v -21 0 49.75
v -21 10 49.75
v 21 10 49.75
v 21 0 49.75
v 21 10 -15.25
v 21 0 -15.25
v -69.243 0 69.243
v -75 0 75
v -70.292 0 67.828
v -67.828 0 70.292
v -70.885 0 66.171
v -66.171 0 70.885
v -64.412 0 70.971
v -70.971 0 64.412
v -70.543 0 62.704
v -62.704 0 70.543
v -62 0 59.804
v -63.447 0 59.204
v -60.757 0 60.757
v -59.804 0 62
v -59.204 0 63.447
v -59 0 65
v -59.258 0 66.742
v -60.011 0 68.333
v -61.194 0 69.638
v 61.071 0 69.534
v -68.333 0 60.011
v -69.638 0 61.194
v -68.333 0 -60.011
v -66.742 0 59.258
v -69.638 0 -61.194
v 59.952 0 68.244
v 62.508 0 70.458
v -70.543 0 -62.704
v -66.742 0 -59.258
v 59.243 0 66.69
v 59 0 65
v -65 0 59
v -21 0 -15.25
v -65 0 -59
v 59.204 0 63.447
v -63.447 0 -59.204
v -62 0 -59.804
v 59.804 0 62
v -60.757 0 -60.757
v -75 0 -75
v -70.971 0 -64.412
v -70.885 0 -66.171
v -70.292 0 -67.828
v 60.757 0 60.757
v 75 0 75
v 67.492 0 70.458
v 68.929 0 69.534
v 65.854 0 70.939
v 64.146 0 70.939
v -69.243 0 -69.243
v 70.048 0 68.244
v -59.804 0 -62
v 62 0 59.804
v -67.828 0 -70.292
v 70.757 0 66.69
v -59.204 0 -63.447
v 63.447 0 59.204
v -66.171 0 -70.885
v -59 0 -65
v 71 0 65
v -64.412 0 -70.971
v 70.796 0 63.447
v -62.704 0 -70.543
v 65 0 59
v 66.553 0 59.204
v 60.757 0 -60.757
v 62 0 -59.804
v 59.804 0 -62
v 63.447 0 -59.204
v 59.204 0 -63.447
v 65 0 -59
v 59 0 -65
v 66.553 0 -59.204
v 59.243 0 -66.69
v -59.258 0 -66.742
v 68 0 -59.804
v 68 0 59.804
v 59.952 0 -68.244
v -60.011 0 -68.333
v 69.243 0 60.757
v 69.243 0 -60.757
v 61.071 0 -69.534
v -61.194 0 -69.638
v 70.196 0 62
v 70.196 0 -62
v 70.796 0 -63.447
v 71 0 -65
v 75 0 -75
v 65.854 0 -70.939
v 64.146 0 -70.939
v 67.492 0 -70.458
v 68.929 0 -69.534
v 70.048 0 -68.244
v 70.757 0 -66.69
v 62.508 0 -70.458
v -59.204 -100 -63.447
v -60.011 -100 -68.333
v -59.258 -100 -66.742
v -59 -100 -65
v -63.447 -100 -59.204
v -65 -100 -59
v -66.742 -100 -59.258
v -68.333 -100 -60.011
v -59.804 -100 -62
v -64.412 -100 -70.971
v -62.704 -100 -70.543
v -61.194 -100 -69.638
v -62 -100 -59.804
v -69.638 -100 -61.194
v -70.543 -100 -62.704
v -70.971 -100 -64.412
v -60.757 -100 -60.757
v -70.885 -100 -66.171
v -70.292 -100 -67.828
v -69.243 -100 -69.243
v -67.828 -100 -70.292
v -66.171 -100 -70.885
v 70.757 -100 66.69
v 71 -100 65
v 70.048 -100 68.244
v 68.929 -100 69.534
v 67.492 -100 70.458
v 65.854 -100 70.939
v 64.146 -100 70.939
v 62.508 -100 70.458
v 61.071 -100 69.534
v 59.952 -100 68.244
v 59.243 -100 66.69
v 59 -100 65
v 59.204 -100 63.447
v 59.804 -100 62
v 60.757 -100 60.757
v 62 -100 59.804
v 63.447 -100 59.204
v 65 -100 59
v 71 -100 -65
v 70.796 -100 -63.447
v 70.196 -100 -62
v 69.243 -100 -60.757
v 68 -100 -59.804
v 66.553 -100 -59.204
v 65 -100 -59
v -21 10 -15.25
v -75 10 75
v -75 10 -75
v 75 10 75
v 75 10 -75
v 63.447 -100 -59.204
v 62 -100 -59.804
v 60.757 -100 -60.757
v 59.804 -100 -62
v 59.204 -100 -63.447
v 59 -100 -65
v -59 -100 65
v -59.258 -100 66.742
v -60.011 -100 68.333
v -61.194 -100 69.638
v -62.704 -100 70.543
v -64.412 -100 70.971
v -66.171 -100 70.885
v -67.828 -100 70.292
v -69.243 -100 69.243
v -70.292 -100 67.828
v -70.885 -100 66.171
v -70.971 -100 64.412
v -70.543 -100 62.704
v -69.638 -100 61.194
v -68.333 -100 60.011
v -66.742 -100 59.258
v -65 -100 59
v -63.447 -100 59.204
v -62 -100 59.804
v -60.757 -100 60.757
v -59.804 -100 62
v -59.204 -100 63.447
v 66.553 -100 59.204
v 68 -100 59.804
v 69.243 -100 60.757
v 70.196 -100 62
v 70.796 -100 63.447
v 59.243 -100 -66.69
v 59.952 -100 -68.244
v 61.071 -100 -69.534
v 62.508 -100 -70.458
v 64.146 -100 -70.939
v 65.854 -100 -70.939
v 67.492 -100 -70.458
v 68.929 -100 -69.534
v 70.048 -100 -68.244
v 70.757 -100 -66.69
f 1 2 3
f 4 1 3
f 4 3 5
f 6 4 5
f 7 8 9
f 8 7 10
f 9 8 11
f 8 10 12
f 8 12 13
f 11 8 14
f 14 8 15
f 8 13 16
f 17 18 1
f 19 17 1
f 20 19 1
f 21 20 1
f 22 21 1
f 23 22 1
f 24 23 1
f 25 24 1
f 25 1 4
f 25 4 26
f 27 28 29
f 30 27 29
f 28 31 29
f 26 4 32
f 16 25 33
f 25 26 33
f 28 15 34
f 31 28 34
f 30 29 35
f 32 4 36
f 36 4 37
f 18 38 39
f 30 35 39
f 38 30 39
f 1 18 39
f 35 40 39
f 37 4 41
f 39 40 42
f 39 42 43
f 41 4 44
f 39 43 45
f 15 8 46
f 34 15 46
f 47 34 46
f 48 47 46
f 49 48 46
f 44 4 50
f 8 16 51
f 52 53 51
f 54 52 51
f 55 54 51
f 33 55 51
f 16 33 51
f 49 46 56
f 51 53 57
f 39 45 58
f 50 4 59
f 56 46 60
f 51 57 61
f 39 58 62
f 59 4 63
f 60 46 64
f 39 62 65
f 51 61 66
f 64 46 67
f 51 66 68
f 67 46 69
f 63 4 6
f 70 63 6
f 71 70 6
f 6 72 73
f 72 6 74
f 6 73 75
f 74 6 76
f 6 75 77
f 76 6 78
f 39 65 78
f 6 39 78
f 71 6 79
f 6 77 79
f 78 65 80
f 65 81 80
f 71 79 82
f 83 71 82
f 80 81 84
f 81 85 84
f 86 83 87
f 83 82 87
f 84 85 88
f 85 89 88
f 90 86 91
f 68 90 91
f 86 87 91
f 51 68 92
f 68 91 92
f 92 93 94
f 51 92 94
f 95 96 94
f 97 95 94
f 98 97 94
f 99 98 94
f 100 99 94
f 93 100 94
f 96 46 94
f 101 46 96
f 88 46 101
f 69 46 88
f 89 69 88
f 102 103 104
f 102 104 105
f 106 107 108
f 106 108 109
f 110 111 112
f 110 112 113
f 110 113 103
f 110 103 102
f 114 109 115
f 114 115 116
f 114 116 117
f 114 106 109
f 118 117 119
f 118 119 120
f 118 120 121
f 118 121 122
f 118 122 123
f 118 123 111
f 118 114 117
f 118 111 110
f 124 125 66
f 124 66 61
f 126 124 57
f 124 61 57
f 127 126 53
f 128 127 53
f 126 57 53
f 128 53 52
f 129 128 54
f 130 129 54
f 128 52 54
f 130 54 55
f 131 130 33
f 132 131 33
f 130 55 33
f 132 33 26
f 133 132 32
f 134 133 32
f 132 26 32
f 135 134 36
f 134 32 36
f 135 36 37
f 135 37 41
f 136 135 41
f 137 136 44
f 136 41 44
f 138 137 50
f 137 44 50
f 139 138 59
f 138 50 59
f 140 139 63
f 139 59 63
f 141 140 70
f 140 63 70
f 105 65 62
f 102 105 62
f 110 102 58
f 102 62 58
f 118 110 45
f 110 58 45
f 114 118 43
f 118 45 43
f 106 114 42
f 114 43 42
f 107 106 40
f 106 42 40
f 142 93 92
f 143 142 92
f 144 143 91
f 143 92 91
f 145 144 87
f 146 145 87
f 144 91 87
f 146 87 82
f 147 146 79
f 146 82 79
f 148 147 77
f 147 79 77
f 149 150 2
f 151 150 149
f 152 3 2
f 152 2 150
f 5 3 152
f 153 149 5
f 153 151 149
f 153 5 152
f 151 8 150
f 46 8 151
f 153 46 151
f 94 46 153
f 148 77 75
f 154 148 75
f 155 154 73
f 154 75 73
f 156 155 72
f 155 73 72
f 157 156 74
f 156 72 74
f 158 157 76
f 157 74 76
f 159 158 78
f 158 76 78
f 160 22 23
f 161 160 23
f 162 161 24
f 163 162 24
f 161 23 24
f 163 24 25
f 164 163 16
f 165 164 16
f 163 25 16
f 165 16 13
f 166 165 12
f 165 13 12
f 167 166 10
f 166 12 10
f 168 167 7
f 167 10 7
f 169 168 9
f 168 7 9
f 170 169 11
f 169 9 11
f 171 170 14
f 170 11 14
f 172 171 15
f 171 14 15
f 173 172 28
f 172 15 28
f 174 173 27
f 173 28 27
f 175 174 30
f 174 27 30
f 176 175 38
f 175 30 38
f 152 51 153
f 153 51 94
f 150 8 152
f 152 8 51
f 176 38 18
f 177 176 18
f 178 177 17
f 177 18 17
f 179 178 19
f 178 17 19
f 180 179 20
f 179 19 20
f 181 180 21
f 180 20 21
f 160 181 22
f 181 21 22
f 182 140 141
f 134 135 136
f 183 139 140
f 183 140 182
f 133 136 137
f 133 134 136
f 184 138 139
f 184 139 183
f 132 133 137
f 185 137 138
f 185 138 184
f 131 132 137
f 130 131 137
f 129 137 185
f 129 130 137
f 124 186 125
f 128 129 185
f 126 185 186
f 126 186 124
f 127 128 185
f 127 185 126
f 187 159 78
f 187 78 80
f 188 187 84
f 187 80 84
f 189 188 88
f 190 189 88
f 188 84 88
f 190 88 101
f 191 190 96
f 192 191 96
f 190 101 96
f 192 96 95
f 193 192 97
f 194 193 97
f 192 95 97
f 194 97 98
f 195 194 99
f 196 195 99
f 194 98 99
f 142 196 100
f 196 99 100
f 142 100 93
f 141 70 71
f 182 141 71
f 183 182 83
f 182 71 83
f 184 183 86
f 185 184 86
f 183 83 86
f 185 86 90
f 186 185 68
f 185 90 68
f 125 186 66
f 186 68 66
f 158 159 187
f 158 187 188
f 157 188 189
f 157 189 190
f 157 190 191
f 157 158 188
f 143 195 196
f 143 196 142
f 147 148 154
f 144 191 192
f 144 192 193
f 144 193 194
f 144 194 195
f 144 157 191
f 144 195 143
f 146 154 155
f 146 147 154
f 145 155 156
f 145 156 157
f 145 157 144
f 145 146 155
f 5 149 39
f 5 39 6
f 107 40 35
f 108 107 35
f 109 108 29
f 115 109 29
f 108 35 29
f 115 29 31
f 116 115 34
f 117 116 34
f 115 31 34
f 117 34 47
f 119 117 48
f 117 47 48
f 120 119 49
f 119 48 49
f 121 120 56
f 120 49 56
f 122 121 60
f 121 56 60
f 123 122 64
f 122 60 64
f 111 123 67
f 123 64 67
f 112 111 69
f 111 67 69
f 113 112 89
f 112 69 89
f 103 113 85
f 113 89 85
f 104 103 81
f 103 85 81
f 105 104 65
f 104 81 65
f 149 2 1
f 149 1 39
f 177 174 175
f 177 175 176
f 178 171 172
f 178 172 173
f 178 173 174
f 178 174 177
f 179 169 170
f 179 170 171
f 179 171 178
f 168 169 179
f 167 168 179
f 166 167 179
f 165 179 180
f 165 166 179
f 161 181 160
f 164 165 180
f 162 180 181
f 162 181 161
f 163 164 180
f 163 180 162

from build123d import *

# Parameters (mm, degrees)
SKETCH1_W           = 150
SKETCH1_H           = 150
BOSS_EXTRUDE2_DEPTH = 10
BOSS_EXTRUDE3_DEPTH = 100
SKETCH4_W           = 42
SKETCH4_H           = 65
CUT_EXTRUDE1_DEPTH  = 111


with BuildPart() as part:
    # Sketch1 → Boss-Extrude2 (new body)
    with BuildSketch(Plane(origin=(0, 0, 0), x_dir=(1, 0, 0), z_dir=(0, 1, 0))):
        Rectangle(SKETCH1_W, SKETCH1_H)
    extrude(amount=BOSS_EXTRUDE2_DEPTH)

    # Sketch3 → Boss-Extrude3 (add)
    with BuildSketch(Plane.XZ):
        with BuildLine():
            ThreePointArc((-59, 65), (-69.242640687, 69.242640687), (-65, 59))
            Line((-65, 59), (-65, 65))
            Line((-65, 65), (-59, 65))
        make_face()
        with BuildLine():
            Line((-65, 65), (-65, 59))
            ThreePointArc((-65, 59), (-60.757359313, 60.757359313), (-59, 65))
            Line((-59, 65), (-65, 65))
        make_face()
        with BuildLine():
            ThreePointArc((59, 65), (60.757359313, 60.757359313), (65, 59))
            Line((65, 59), (65, 65))
            Line((65, 65), (59, 65))
        make_face()
        with BuildLine():
            Line((65, 65), (65, 59))
            ThreePointArc((65, 59), (69.242640687, 60.757359313), (71, 65))
            ThreePointArc((71, 65), (65, 71), (59, 65))
            Line((59, 65), (65, 65))
        make_face()
        with BuildLine():
            ThreePointArc((59, 65), (60.757359313, 60.757359313), (65, 59))
            Line((65, 59), (65, 65))
            Line((65, 65), (59, 65))
        make_face()
        with BuildLine():
            Line((65, 65), (65, 59))
            ThreePointArc((65, 59), (69.242640687, 60.757359313), (71, 65))
            ThreePointArc((71, 65), (65, 71), (59, 65))
            Line((59, 65), (65, 65))
        make_face()
        with BuildLine():
            ThreePointArc((-59, 65), (-69.242640687, 69.242640687), (-65, 59))
            Line((-65, 59), (-65, 65))
            Line((-65, 65), (-59, 65))
        make_face()
        with BuildLine():
            Line((-65, 65), (-65, 59))
            ThreePointArc((-65, 59), (-60.757359313, 60.757359313), (-59, 65))
            Line((-59, 65), (-65, 65))
        make_face()
        with BuildLine():
            Line((-65, -59), (-65, -65))
            Line((-65, -65), (-59, -65))
            ThreePointArc((-59, -65), (-60.757359313, -60.757359313), (-65, -59))
        make_face()
        with BuildLine():
            Line((-59, -65), (-65, -65))
            Line((-65, -65), (-65, -59))
            ThreePointArc((-65, -59), (-69.242640687, -69.242640687), (-59, -65))
        make_face()
        with BuildLine():
            Line((-65, -59), (-65, -65))
            Line((-65, -65), (-59, -65))
            ThreePointArc((-59, -65), (-60.757359313, -60.757359313), (-65, -59))
        make_face()
        with BuildLine():
            Line((-59, -65), (-65, -65))
            Line((-65, -65), (-65, -59))
            ThreePointArc((-65, -59), (-69.242640687, -69.242640687), (-59, -65))
        make_face()
        with BuildLine():
            ThreePointArc((65, -59), (60.757359313, -60.757359313), (59, -65))
            Line((59, -65), (65, -65))
            Line((65, -65), (65, -59))
        make_face()
        with BuildLine():
            Line((65, -65), (59, -65))
            ThreePointArc((59, -65), (65, -71), (71, -65))
            ThreePointArc((71, -65), (69.242640687, -60.757359313), (65, -59))
            Line((65, -59), (65, -65))
        make_face()
        with BuildLine():
            ThreePointArc((65, -59), (60.757359313, -60.757359313), (59, -65))
            Line((59, -65), (65, -65))
            Line((65, -65), (65, -59))
        make_face()
        with BuildLine():
            Line((65, -65), (59, -65))
            ThreePointArc((59, -65), (65, -71), (71, -65))
            ThreePointArc((71, -65), (69.242640687, -60.757359313), (65, -59))
            Line((65, -59), (65, -65))
        make_face()
    extrude(amount=BOSS_EXTRUDE3_DEPTH)

    # Sketch4 → Cut-Extrude1 (cut, through all)
    with BuildSketch(Plane(origin=(0, 10, 0), x_dir=(1, 0, 0), z_dir=(0, 1, 0))):
        with Locations((0, -17.25)):
            Rectangle(SKETCH4_W, SKETCH4_H)
    extrude(amount=-CUT_EXTRUDE1_DEPTH, mode=Mode.SUBTRACT)


solid = part.part
